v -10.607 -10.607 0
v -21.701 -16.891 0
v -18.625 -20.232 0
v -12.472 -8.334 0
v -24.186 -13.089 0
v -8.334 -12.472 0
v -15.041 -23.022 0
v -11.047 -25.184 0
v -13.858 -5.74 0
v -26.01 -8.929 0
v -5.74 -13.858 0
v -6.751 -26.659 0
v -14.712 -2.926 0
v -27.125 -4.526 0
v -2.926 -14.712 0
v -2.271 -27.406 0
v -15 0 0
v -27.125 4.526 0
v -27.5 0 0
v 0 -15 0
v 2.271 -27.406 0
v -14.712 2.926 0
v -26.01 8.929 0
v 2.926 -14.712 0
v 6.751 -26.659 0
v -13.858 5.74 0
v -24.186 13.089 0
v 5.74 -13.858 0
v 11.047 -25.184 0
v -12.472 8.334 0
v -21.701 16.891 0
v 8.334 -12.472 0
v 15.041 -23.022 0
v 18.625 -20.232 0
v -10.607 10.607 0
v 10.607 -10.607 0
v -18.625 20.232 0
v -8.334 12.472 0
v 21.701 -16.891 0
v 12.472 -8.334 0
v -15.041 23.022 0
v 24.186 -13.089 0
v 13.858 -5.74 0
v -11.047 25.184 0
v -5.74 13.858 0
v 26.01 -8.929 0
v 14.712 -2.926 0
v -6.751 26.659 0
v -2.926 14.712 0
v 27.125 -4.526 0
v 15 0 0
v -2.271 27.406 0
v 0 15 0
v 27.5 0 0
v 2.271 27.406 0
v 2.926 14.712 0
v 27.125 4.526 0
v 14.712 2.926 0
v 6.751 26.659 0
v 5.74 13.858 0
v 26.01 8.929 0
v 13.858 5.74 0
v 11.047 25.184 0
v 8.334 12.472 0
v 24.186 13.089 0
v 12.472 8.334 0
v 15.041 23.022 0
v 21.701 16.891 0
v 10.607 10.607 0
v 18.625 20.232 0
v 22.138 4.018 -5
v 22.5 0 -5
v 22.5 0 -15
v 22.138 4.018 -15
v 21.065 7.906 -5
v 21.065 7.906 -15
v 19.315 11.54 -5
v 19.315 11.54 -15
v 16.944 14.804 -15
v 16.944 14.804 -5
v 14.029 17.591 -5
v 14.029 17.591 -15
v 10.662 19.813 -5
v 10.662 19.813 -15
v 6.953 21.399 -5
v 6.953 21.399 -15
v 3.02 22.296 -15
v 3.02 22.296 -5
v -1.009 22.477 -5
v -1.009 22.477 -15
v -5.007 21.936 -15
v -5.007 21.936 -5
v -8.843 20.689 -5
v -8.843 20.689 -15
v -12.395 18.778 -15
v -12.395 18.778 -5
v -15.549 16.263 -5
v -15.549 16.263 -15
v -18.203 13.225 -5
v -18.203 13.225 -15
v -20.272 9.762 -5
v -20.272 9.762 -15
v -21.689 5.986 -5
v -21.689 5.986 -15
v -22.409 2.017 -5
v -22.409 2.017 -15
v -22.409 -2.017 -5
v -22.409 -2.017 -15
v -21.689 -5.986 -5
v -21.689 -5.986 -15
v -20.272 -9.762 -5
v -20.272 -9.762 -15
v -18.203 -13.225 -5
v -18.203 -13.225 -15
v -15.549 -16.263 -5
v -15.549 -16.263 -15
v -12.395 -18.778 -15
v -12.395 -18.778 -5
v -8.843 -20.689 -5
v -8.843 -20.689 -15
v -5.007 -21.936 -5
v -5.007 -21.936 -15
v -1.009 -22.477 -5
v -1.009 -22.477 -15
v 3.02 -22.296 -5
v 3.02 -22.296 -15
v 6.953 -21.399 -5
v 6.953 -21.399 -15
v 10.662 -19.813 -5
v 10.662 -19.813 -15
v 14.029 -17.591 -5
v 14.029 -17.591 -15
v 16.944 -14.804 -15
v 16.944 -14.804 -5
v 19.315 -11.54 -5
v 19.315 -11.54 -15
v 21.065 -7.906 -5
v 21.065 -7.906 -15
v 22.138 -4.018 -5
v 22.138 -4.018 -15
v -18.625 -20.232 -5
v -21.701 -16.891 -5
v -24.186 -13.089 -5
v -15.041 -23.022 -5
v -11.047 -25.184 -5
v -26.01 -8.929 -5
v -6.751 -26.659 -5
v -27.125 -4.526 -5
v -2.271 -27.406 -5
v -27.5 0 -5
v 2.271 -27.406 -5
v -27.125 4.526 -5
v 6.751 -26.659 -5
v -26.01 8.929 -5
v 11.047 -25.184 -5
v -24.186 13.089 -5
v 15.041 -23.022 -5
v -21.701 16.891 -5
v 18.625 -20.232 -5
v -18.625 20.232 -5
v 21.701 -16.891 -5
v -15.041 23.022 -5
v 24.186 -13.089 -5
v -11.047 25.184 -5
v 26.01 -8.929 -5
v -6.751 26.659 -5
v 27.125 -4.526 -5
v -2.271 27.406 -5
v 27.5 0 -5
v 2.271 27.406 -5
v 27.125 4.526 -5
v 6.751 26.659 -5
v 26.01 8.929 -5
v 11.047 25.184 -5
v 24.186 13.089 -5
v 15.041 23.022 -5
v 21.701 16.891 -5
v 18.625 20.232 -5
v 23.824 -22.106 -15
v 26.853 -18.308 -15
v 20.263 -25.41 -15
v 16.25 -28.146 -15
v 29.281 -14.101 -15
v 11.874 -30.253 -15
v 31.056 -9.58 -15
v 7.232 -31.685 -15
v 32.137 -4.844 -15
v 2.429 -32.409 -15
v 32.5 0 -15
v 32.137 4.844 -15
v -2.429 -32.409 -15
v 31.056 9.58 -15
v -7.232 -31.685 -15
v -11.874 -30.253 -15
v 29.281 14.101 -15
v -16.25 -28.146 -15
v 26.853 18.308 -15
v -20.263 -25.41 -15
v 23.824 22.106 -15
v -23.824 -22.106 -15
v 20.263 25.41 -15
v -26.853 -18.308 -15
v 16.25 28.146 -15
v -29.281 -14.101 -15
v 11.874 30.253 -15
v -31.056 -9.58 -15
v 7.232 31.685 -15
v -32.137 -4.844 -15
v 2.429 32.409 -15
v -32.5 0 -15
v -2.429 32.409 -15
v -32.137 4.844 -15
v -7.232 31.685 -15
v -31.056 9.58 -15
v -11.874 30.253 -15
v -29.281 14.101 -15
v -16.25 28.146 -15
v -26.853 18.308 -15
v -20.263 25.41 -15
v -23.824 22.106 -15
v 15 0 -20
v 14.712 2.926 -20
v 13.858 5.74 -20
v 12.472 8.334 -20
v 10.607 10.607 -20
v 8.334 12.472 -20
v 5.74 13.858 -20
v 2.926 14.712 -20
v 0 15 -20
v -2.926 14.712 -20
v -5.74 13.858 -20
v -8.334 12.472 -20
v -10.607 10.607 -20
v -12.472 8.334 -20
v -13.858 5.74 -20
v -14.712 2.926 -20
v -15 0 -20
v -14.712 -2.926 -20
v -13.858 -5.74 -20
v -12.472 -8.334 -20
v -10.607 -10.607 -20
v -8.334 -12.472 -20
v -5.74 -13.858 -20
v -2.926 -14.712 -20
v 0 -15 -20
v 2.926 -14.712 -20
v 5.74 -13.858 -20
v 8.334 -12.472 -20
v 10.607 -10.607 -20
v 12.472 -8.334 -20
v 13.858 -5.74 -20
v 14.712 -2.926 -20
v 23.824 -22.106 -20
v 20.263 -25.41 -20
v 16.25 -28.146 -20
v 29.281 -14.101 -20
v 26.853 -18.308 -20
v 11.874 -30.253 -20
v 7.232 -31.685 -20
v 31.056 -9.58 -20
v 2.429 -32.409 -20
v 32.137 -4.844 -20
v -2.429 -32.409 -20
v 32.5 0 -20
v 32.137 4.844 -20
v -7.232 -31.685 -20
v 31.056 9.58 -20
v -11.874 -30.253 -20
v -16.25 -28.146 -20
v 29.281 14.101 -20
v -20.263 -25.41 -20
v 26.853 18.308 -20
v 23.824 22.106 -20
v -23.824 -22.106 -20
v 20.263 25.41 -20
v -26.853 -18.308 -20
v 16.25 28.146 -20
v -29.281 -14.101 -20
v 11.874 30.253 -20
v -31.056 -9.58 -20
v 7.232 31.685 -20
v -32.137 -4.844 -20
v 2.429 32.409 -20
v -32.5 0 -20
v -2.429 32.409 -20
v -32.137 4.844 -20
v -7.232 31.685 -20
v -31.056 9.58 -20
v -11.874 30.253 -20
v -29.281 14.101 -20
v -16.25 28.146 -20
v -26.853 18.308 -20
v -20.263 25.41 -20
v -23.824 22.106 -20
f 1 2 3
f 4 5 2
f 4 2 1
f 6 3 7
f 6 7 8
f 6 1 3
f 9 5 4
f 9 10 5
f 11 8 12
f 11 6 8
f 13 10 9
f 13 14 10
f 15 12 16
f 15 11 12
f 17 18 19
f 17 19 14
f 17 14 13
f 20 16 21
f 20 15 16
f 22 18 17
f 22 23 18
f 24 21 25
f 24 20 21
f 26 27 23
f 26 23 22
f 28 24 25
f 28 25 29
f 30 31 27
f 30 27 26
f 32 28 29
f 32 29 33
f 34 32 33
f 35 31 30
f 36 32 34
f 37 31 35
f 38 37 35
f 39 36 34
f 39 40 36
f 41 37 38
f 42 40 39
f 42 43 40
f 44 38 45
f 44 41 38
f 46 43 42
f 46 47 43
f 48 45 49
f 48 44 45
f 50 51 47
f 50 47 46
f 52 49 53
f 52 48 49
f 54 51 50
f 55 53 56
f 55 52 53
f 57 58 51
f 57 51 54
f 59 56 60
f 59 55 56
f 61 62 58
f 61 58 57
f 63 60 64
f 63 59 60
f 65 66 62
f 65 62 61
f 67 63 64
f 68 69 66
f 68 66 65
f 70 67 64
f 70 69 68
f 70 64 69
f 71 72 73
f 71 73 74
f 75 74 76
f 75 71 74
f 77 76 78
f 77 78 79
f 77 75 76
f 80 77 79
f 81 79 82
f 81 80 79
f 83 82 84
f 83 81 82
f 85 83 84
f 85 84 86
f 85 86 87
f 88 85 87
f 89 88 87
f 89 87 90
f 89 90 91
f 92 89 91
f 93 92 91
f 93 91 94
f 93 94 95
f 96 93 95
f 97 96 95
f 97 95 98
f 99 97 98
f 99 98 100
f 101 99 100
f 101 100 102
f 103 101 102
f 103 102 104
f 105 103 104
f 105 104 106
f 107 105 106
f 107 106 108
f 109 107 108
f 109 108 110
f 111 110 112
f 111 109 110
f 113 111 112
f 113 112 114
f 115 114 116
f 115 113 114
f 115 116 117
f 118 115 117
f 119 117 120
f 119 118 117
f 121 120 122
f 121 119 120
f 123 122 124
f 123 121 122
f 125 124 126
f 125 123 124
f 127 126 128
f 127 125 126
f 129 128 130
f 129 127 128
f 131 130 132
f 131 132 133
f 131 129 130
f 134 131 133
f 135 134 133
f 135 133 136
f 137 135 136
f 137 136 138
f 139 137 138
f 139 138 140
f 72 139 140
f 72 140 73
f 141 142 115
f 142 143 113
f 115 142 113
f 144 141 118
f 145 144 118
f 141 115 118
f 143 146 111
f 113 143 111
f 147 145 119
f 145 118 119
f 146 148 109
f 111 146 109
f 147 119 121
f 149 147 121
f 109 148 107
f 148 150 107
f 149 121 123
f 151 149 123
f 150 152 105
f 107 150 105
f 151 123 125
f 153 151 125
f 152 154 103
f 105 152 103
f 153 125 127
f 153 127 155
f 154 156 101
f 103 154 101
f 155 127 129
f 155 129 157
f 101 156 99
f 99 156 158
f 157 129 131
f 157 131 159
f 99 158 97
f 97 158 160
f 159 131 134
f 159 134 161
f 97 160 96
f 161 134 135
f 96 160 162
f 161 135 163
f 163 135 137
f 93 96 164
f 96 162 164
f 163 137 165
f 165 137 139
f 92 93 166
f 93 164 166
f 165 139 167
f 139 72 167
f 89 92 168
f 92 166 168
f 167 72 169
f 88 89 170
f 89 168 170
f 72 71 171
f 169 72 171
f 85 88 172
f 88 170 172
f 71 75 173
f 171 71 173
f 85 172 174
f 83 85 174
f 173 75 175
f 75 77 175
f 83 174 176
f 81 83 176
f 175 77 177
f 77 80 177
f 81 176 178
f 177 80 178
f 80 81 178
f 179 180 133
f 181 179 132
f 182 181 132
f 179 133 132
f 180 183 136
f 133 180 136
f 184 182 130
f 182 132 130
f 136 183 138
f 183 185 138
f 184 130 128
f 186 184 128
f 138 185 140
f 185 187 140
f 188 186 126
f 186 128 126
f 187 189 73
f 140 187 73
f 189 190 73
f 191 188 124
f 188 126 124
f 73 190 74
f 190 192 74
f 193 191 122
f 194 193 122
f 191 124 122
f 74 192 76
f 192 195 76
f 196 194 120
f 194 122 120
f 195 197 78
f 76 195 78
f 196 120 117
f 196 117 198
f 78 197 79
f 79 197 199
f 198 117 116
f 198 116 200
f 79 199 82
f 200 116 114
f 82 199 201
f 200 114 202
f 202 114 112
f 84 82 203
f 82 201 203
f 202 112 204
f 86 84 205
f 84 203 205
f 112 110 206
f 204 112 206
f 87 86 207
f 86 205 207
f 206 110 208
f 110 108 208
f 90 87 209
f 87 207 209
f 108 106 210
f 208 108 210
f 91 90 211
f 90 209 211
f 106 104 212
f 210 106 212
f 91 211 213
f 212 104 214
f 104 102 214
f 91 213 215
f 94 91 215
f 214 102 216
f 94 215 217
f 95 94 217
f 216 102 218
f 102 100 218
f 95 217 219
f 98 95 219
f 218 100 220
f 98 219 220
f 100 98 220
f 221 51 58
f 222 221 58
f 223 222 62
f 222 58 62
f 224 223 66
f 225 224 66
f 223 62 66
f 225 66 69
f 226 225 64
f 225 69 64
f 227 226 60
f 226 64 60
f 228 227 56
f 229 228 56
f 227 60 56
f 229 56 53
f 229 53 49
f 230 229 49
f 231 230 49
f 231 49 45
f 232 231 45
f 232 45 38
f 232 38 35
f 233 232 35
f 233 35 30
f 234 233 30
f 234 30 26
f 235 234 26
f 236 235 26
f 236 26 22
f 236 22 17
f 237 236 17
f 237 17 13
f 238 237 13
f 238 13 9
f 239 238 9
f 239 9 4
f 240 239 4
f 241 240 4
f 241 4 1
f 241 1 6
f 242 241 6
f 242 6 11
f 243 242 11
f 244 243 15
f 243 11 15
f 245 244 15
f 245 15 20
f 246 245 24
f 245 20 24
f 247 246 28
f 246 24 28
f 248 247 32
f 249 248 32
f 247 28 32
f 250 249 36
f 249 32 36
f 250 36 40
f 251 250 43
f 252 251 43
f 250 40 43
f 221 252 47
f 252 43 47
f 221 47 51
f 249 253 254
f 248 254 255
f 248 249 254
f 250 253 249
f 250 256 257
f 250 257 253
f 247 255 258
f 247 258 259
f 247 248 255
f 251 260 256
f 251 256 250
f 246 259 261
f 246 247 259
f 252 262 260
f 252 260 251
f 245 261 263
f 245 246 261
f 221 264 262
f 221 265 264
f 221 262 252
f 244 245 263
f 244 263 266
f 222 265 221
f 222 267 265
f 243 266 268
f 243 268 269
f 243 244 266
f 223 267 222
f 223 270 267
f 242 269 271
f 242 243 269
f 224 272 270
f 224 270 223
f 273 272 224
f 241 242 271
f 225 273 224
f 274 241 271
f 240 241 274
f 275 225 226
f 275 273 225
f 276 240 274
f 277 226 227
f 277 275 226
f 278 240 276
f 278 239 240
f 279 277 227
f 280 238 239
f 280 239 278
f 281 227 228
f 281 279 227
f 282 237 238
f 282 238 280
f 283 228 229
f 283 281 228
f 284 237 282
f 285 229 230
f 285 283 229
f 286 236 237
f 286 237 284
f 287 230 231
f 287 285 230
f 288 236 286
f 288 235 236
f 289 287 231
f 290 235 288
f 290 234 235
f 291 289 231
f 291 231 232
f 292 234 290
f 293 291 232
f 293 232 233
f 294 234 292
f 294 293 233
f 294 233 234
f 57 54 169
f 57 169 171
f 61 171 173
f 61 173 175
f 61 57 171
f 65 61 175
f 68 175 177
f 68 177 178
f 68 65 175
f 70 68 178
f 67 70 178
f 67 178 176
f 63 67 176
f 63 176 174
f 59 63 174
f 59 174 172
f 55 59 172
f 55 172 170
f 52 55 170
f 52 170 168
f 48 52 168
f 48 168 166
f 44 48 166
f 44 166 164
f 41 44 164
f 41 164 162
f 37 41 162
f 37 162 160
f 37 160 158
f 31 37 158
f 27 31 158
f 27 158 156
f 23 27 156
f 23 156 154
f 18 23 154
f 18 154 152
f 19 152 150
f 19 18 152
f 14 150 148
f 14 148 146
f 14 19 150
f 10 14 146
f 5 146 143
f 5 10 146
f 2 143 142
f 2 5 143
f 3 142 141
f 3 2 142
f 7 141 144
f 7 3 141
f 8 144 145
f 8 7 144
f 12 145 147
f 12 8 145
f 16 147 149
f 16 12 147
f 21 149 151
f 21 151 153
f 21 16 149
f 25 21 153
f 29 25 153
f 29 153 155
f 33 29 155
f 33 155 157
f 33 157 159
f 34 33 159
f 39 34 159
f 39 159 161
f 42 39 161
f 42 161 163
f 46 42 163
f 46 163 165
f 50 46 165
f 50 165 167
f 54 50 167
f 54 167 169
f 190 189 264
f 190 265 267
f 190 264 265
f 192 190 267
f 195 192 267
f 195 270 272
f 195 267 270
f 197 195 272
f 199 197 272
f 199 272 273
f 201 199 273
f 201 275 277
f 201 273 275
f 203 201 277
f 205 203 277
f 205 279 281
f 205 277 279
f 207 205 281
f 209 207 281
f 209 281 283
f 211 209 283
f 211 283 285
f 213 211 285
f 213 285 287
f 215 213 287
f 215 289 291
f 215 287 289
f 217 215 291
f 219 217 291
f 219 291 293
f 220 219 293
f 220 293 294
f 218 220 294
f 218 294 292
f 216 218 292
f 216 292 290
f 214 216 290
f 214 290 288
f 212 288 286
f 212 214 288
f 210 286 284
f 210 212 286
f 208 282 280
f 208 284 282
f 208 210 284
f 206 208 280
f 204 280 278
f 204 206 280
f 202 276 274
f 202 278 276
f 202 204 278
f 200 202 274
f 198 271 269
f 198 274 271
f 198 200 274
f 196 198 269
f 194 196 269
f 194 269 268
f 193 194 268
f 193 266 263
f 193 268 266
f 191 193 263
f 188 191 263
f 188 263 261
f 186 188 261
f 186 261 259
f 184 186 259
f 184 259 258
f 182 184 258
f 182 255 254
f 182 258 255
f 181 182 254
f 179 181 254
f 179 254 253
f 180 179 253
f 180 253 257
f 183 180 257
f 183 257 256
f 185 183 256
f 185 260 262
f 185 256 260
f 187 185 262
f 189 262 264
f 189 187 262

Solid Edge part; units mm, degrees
sketch "Sketch1" plane through (0, 0, 0) normal (0, 0, 1) x (1, 0, 0)
  circle A0 centre (0, 0) radius 27.5
extrude "Protrusion1" add sketch "Sketch1" against normal blind 5
sketch "Sketch2" plane through (0, 0, 0) normal (0, 0, 1) x (1, 0, 0)
  circle A0 centre (0, 0) radius 22.5
extrude "ExtrudedProtrusion_4" add sketch "Sketch2" against normal blind 15
sketch "Sketch3" plane through (0, 0, -15) normal (0, 0, -1) x (1, 0, 0)
  circle A0 centre (0, 0) radius 32.5
extrude "ExtrudedProtrusion_6" add sketch "Sketch3" along normal blind 5
sketch "Sketch4" plane through (0, 0, 0) normal (0, 0, 1) x (1, 0, 0)
  circle A0 centre (0, 0) radius 15
extrude "ExtrudedCutout_2" cut sketch "Sketch4" against normal blind 22
